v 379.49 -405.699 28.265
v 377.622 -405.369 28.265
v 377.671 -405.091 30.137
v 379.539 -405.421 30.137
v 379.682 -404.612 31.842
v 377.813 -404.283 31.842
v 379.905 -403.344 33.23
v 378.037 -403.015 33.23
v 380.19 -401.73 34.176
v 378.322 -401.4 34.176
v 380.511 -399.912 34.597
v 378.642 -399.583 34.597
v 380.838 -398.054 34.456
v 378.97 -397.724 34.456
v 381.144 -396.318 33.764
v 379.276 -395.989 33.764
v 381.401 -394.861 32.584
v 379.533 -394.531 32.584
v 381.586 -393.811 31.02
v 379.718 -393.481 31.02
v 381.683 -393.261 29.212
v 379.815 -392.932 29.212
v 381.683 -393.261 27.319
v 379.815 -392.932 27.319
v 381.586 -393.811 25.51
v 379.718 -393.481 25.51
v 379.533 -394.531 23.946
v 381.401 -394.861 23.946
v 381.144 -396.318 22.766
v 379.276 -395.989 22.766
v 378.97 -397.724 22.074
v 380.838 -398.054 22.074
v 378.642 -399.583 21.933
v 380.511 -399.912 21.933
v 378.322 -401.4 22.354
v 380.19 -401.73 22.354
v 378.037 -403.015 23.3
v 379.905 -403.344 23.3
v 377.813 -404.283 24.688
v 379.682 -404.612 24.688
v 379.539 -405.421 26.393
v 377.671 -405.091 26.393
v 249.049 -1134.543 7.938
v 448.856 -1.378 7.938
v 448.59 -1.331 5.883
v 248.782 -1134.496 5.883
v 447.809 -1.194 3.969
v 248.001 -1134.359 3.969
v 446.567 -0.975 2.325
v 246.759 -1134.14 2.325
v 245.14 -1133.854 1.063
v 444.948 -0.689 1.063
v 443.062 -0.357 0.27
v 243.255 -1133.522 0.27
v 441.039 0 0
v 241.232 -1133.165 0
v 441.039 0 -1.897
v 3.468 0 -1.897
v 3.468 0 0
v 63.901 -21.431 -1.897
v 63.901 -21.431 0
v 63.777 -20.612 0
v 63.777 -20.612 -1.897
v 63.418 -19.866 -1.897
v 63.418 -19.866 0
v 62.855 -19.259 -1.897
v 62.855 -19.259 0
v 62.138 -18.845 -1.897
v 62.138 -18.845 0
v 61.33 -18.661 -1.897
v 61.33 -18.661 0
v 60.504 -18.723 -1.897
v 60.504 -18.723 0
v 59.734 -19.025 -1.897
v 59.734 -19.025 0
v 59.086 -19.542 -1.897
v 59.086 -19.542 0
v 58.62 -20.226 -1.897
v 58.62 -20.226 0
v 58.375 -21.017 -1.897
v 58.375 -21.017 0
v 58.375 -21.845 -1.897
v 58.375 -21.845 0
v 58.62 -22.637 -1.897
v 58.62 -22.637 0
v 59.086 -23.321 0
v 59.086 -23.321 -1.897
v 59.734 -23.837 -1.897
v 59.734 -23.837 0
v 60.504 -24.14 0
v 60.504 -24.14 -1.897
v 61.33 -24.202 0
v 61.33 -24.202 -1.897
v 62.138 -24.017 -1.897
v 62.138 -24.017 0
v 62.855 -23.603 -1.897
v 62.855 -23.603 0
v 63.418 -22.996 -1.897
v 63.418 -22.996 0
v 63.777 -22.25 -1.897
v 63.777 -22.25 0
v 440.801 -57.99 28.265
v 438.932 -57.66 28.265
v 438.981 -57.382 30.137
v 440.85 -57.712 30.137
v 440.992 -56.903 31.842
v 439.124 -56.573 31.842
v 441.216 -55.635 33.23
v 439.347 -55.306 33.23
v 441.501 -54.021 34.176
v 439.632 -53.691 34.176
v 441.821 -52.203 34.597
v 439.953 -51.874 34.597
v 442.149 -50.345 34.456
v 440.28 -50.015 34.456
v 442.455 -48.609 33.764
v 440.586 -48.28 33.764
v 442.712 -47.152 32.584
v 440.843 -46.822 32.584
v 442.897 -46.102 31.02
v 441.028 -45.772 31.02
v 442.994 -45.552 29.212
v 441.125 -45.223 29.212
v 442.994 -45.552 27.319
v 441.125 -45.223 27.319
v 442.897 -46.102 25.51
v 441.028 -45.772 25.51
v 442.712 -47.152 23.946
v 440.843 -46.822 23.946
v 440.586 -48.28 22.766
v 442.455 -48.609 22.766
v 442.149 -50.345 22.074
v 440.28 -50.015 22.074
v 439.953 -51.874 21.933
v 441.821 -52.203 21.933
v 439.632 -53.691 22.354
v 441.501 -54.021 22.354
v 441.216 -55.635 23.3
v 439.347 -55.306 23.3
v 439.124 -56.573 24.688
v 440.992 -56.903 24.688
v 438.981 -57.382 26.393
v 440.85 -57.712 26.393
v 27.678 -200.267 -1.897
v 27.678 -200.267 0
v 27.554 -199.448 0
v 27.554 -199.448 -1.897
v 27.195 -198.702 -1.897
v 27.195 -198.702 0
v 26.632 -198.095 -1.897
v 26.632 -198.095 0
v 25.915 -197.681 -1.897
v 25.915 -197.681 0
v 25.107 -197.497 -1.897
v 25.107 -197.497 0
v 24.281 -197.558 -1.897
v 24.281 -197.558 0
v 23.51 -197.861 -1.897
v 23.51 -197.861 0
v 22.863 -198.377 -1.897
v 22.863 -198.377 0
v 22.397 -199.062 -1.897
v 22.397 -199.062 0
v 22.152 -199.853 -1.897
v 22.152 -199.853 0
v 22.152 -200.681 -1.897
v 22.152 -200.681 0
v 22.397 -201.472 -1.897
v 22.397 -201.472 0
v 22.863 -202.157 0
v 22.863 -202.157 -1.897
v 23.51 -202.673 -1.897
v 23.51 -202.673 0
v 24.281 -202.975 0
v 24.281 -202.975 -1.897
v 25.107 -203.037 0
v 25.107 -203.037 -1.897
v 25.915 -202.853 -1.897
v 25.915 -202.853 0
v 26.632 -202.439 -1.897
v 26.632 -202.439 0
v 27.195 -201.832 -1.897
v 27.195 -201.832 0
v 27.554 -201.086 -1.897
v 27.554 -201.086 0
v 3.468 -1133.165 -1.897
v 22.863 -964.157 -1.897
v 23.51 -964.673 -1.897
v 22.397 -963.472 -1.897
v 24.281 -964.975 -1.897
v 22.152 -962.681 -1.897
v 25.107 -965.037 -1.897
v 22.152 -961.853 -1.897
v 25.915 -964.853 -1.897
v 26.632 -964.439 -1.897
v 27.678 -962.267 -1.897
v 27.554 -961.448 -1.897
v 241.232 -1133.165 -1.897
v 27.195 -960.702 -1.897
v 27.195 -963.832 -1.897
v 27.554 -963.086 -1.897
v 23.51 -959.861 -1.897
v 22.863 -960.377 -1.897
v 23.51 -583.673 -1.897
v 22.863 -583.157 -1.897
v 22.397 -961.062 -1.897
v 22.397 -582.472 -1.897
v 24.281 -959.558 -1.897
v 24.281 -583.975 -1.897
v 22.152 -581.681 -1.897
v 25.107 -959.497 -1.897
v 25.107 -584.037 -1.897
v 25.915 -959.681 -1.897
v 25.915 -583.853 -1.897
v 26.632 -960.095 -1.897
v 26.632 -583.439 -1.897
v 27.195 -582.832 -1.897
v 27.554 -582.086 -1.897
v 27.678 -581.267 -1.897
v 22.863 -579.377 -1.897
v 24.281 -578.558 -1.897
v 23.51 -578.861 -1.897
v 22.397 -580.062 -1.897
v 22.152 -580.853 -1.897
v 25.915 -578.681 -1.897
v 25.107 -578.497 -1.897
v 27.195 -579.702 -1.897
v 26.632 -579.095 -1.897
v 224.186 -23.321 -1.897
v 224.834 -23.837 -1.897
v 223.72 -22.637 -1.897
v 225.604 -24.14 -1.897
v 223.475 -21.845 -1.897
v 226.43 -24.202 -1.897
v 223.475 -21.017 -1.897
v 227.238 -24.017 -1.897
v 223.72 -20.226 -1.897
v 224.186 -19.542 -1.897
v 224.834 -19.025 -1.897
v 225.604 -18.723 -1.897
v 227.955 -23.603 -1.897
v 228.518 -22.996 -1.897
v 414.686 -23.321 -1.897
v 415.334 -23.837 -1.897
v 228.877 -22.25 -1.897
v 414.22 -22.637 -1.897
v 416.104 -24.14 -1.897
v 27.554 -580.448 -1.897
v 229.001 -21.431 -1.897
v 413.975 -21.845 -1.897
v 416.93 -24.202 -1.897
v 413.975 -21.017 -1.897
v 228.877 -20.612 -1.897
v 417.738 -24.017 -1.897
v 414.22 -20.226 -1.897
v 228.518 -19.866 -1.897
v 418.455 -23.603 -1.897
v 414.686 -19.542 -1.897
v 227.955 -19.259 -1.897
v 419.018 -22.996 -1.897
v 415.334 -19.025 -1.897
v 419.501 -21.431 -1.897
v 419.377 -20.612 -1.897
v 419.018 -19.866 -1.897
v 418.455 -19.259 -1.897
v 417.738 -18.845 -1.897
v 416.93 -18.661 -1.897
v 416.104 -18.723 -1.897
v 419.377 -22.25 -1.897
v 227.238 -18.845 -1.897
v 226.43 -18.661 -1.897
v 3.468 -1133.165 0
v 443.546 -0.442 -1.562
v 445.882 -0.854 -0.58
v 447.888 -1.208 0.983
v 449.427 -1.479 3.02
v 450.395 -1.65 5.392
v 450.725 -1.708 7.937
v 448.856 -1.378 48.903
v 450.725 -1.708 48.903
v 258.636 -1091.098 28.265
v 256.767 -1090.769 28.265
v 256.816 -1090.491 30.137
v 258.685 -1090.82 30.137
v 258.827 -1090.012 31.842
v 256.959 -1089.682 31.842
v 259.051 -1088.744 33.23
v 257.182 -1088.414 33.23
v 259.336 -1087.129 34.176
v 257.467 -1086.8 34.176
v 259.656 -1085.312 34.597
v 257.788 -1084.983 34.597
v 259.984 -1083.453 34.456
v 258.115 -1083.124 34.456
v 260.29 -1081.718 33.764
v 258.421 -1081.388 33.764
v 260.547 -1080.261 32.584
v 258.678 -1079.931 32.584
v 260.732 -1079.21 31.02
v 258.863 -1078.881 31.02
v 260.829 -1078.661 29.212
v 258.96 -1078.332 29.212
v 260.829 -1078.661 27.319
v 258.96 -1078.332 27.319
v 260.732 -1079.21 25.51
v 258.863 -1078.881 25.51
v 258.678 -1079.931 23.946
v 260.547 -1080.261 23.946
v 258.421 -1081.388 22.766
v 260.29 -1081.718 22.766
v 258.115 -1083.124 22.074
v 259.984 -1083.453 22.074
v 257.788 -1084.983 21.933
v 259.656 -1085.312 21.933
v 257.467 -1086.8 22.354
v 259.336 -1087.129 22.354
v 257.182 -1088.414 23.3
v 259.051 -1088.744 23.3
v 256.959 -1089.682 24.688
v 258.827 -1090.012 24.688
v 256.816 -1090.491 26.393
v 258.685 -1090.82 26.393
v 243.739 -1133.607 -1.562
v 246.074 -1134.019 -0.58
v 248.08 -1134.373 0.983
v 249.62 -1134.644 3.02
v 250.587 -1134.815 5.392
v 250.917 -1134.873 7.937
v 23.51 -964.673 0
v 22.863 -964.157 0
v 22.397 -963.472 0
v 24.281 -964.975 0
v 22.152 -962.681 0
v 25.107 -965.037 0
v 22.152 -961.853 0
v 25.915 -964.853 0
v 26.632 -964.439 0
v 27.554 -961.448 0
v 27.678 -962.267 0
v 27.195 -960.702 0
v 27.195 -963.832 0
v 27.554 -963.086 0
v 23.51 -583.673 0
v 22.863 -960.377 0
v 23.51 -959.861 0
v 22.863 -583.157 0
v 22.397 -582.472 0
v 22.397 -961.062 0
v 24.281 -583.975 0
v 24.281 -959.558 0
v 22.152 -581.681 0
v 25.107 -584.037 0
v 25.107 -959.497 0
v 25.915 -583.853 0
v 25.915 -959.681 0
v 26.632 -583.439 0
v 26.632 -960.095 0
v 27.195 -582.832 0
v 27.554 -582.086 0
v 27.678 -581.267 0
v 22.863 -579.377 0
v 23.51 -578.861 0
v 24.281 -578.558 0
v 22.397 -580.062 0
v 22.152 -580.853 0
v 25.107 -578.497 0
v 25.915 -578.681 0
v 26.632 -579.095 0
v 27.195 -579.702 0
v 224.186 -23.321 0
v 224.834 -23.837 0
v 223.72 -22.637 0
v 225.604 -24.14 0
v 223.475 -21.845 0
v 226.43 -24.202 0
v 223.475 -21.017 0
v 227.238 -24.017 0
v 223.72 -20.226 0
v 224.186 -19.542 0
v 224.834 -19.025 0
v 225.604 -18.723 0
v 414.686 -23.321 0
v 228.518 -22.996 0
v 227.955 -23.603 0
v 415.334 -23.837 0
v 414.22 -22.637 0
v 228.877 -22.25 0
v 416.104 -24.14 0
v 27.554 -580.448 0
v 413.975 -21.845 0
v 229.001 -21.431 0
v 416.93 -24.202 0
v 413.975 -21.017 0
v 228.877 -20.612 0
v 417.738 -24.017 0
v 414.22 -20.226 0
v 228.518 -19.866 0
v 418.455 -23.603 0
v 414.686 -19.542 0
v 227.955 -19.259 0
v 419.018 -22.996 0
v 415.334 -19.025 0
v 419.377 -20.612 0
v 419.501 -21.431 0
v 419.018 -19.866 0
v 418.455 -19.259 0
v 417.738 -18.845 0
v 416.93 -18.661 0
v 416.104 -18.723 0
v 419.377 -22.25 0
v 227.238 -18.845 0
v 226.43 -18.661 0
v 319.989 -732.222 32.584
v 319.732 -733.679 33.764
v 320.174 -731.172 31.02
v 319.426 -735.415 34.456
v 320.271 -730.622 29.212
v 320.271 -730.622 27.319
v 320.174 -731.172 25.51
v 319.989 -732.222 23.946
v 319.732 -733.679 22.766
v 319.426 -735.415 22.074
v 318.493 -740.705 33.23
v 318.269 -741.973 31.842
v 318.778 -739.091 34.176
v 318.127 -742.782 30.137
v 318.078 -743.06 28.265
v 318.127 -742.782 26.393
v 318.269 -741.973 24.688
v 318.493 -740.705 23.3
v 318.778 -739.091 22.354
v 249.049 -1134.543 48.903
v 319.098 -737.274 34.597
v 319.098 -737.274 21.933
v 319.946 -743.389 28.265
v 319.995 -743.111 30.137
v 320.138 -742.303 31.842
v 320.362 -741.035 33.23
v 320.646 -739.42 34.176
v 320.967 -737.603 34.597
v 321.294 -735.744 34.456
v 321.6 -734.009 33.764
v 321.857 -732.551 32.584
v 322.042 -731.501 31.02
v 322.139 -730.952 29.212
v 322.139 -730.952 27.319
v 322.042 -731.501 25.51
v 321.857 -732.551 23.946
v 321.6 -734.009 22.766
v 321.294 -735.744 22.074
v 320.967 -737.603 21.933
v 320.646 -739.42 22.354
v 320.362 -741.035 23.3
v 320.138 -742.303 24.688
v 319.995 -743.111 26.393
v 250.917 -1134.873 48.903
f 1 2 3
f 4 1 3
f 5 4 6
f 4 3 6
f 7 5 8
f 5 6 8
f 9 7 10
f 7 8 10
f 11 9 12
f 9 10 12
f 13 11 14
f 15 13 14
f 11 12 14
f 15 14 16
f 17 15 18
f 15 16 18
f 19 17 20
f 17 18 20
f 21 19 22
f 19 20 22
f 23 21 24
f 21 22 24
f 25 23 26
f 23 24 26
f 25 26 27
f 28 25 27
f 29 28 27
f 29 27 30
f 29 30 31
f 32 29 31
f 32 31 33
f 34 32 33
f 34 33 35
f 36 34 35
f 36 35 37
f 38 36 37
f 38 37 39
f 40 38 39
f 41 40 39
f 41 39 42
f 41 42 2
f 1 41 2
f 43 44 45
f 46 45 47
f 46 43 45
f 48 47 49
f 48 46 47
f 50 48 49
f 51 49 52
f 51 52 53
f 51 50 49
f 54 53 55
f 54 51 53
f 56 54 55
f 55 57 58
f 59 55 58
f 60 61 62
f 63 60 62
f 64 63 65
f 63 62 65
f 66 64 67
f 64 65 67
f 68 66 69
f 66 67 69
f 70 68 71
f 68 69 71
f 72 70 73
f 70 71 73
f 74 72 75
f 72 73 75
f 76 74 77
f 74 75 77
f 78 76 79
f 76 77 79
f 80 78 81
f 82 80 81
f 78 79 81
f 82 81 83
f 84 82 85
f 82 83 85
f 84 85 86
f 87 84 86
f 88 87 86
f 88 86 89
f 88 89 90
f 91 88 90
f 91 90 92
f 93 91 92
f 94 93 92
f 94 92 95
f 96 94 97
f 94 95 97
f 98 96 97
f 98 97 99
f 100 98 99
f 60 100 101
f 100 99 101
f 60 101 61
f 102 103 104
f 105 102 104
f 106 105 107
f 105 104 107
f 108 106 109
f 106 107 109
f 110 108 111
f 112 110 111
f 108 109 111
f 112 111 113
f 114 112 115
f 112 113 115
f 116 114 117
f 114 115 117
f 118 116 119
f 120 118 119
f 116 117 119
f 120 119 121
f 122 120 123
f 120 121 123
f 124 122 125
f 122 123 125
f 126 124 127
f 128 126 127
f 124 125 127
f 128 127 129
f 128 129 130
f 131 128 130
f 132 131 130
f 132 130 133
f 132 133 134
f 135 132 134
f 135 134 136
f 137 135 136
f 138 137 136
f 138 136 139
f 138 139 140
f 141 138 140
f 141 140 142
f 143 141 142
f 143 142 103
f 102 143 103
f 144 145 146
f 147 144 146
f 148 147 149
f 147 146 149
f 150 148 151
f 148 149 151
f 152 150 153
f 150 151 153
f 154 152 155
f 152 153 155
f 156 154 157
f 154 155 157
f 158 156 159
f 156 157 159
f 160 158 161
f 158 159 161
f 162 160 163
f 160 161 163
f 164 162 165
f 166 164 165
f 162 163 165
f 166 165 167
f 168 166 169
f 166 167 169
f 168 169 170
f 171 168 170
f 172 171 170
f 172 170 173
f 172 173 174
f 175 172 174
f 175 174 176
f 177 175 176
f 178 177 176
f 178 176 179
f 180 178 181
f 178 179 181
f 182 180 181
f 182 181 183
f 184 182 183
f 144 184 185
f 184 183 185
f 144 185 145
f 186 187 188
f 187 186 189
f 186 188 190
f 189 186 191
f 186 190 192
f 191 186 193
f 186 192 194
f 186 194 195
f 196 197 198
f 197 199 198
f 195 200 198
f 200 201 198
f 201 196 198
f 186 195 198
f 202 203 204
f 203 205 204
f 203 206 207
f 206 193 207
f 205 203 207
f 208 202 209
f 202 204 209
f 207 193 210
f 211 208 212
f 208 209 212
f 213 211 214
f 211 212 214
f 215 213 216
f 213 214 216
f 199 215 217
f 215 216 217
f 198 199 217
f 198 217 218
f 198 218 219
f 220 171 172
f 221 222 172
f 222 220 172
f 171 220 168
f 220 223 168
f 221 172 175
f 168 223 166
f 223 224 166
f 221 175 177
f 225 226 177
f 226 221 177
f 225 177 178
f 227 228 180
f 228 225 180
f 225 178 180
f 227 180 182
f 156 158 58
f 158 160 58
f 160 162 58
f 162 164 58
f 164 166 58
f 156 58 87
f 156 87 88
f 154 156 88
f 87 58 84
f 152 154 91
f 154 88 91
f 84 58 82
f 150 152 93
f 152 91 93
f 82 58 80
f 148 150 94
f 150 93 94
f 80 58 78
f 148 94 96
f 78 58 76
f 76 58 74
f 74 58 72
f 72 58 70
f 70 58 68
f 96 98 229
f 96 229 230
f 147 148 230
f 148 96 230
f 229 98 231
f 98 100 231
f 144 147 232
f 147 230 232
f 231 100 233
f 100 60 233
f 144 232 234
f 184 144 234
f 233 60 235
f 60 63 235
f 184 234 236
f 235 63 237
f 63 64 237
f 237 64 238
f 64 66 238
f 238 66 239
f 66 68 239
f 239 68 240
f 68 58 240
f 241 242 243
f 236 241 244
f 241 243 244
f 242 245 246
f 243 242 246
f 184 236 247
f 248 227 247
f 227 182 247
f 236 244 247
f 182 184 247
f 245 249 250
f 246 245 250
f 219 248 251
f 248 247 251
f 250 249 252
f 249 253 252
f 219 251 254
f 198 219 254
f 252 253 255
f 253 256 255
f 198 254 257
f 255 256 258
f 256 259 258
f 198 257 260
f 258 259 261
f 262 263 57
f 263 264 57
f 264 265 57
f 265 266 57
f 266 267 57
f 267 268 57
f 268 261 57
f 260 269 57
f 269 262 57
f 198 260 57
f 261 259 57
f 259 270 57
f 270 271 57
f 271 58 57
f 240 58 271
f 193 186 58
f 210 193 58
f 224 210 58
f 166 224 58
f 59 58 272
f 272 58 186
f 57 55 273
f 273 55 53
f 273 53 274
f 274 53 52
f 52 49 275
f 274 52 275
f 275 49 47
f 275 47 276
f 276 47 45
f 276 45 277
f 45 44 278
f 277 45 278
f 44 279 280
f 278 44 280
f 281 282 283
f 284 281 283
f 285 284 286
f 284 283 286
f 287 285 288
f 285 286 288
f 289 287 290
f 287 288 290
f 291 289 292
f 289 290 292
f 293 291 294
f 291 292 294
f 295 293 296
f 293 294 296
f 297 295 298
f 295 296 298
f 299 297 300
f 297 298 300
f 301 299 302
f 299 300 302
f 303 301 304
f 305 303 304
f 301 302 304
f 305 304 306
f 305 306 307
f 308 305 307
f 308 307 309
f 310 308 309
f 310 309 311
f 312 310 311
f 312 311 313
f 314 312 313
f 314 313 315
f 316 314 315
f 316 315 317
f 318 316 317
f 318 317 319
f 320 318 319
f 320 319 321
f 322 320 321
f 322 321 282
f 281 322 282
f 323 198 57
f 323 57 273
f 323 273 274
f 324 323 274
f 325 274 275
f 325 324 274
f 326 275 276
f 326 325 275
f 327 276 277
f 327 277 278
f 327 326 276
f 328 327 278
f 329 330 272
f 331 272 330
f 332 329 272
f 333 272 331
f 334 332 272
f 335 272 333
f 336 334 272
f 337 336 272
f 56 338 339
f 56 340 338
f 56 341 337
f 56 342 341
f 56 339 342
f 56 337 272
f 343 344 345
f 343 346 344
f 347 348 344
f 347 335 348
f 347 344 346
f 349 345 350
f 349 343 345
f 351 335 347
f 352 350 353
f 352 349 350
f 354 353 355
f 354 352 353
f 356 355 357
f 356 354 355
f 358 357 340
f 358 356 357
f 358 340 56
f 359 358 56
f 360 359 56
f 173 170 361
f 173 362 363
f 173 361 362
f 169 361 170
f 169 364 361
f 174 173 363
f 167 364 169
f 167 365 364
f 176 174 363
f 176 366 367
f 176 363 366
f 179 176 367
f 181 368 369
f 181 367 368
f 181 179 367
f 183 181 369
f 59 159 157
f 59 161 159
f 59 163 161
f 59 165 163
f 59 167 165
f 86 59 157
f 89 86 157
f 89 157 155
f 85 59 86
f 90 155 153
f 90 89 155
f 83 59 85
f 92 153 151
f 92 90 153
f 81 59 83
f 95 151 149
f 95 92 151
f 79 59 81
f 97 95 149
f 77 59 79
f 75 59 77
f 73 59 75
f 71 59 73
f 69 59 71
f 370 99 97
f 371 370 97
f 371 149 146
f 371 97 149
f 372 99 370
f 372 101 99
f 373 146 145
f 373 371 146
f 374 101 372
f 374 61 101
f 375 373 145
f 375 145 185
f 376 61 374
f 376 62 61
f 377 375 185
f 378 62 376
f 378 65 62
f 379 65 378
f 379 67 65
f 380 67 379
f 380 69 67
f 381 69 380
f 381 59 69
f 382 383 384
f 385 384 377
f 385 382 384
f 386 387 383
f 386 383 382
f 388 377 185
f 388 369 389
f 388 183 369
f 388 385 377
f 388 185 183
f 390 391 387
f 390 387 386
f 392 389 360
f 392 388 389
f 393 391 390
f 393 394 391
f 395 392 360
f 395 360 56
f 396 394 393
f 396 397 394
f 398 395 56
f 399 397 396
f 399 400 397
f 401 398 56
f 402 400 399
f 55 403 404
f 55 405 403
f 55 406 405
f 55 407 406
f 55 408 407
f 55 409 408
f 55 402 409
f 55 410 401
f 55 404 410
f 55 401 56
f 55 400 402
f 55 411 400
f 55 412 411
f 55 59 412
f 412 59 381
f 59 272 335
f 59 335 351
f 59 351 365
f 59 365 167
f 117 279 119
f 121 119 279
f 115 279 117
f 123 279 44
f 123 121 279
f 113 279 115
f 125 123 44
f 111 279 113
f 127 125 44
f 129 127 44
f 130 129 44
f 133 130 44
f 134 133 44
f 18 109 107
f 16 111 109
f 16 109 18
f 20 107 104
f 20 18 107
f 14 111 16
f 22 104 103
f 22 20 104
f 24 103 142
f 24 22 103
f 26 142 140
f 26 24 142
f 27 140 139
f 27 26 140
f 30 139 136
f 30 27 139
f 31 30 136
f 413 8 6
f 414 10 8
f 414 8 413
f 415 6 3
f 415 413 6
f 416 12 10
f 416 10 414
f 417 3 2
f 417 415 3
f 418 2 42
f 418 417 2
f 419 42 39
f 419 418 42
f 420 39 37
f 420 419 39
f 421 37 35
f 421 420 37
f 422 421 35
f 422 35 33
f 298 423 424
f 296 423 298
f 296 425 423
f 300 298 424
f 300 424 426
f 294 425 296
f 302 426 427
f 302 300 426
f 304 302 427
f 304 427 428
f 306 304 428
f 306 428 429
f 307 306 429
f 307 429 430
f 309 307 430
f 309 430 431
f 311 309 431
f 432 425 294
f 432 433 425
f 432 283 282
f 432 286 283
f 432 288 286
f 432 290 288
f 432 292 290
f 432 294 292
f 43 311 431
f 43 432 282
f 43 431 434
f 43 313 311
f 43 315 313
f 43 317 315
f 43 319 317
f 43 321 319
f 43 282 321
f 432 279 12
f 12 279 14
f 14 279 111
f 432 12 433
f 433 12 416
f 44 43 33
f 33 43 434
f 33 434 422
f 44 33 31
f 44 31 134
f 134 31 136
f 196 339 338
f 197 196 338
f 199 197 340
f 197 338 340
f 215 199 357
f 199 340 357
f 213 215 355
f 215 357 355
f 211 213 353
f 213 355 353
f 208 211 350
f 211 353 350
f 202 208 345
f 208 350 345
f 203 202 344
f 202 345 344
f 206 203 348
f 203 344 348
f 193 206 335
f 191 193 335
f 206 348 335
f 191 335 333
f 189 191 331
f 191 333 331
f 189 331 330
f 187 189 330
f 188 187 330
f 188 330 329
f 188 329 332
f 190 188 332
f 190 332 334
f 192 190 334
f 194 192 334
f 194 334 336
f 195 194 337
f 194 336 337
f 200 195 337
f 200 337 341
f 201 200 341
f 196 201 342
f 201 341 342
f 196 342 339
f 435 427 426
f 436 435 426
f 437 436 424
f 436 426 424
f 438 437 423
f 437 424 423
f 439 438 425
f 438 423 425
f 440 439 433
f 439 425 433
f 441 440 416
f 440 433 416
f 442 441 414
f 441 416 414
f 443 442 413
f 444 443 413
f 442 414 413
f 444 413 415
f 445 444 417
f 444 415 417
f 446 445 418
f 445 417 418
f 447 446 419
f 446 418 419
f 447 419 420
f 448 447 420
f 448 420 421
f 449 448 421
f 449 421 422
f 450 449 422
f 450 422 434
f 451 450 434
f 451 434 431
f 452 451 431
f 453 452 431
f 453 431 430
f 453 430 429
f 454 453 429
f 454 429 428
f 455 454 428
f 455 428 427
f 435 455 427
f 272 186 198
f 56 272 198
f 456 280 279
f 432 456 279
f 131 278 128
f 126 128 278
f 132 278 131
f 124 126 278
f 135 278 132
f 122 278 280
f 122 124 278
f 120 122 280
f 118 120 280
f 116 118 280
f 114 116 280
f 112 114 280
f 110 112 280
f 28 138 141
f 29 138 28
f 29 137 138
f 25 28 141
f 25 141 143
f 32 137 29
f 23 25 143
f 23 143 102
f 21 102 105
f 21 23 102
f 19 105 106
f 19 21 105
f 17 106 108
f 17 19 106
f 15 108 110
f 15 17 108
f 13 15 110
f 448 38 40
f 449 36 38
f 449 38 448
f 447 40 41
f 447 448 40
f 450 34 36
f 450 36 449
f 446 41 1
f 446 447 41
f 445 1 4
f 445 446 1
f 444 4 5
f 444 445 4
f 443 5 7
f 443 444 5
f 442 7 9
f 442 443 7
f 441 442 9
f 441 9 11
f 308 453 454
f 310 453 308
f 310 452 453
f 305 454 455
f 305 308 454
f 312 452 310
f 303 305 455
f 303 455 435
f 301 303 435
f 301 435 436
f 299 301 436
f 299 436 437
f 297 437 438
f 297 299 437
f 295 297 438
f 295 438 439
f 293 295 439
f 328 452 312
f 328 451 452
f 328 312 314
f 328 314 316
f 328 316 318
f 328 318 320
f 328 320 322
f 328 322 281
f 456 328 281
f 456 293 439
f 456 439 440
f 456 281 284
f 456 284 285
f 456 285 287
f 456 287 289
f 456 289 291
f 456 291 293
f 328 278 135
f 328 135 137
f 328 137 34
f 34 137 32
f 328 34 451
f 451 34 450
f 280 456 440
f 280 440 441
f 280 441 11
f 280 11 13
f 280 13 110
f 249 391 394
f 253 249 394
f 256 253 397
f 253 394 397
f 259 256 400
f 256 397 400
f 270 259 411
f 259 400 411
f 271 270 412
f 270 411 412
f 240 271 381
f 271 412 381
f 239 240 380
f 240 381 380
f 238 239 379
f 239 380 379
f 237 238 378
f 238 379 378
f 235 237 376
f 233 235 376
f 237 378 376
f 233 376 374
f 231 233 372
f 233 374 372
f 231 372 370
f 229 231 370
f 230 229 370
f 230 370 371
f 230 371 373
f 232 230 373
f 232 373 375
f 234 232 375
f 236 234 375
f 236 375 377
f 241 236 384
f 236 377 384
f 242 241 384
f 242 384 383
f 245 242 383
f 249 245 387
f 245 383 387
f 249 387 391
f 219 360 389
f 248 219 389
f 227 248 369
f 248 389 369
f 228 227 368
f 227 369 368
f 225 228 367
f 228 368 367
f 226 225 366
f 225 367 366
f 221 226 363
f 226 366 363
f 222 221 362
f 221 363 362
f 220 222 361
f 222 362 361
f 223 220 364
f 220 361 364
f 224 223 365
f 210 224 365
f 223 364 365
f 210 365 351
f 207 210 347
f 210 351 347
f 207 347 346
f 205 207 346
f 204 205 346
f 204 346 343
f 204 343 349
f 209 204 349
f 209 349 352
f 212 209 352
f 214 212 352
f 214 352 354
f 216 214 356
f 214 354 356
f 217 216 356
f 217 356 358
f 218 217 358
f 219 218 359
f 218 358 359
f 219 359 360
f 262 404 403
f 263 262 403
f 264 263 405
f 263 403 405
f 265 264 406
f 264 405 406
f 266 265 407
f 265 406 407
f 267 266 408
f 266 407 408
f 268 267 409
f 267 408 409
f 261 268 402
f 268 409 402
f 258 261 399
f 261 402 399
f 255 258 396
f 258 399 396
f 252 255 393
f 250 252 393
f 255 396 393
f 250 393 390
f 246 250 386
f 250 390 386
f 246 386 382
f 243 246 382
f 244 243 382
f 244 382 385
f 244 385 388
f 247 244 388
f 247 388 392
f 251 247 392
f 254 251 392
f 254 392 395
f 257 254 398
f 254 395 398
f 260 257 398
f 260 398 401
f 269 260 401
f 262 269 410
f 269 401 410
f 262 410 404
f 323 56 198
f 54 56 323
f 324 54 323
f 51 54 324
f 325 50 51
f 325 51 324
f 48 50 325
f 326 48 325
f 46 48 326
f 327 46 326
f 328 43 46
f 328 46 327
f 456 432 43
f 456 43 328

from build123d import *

# Parameters (mm, degrees)
BASE_FLANGE1_START = -1.89738
BASE_FLANGE1_DEPTH = 1.89738
EDGE_FLANGE5_DEPTH = 1150.646018509
SKETCH21_R         = 2.778125
CUT_EXTRUDE1_DEPTH = 1.89738
SKETCH22_R         = 6.350000004
CUT_EXTRUDE2_DEPTH = 1144.944756983


# Read off the part's stored shape, not the designer's step: Base-Flange1
# Sheet-metal steps are written as plain solids
with BuildPart() as part:
    # Base-Flange1 outline → Base-Flange1 (new body)
    with BuildSketch(Plane.XY.offset(BASE_FLANGE1_START)):
        Polygon((241.231741087, -1133.16512), (441.039325341, 0), (3.468308846, 0), (3.468308846, -1133.16512), align=None)
    extrude(amount=BASE_FLANGE1_DEPTH)

    # Edge-Flange5 section (across the edge) → Edge-Flange5 (add)
    with BuildSketch(Plane(origin=(249.048652626, -1134.54345241, 0), x_dir=(-0.9848077530122076, 0.17364817766693405, 3.4914813388431337e-15), z_dir=(0.17364817766693405, 0.9848077530122076, 0))):
        with BuildLine():
            Line((-1.89738, 7.9375), (-1.89738, 48.90262))
            Line((-1.89738, 48.90262), (0, 48.90262))
            Line((0, 48.90262), (0, 7.9375))
            ThreePointArc((0, 7.9375), (2.324839924, 2.324839924), (7.9375, 0))
            Line((7.9375, 0), (7.9375, -1.89738))
            ThreePointArc((7.9375, -1.89738), (0.98318966, 0.98318966), (-1.89738, 7.9375))
        make_face()
    extrude(amount=EDGE_FLANGE5_DEPTH)

    # Sketch21 → Cut-Extrude1 (cut)
    with BuildSketch(Plane.XY):
        with Locations((416.722567093, -21.43125)):
            Circle(SKETCH21_R)
        with Locations((226.222567093, -21.43125)):
            Circle(SKETCH21_R)
        with Locations((61.122567093, -21.43125)):
            Circle(SKETCH21_R)
        with Locations((24.899558846, -200.266935)):
            Circle(SKETCH21_R)
        with Locations((24.899558846, -581.266935)):
            Circle(SKETCH21_R)
        with Locations((24.899558846, -962.266935)):
            Circle(SKETCH21_R)
    extrude(amount=-CUT_EXTRUDE1_DEPTH, mode=Mode.SUBTRACT)

    # Sketch22 → Cut-Extrude2 (cut, through all)
    with BuildSketch(Plane(origin=(435.557273959, -76.800499043, 0), x_dir=(0, 0, 1), z_dir=(-0.9848077530122062, 0.17364817766694032, 3.3536738181639377e-15))):
        with Locations(Location((28.26512, 25.785675125, 0), (0, 0, 270))):
            Circle(SKETCH22_R)
        with Locations(Location((28.26512, -327.287334129, 0), (0, 0, 270))):
            Circle(SKETCH22_R)
        with Locations(Location((28.26512, -670.187334129, 0), (0, 0, 270))):
            Circle(SKETCH22_R)
        with Locations(Location((28.26512, -1023.260343384, 0), (0, 0, 270))):
            Circle(SKETCH22_R)
    extrude(amount=-CUT_EXTRUDE2_DEPTH, mode=Mode.SUBTRACT)


solid = part.part
